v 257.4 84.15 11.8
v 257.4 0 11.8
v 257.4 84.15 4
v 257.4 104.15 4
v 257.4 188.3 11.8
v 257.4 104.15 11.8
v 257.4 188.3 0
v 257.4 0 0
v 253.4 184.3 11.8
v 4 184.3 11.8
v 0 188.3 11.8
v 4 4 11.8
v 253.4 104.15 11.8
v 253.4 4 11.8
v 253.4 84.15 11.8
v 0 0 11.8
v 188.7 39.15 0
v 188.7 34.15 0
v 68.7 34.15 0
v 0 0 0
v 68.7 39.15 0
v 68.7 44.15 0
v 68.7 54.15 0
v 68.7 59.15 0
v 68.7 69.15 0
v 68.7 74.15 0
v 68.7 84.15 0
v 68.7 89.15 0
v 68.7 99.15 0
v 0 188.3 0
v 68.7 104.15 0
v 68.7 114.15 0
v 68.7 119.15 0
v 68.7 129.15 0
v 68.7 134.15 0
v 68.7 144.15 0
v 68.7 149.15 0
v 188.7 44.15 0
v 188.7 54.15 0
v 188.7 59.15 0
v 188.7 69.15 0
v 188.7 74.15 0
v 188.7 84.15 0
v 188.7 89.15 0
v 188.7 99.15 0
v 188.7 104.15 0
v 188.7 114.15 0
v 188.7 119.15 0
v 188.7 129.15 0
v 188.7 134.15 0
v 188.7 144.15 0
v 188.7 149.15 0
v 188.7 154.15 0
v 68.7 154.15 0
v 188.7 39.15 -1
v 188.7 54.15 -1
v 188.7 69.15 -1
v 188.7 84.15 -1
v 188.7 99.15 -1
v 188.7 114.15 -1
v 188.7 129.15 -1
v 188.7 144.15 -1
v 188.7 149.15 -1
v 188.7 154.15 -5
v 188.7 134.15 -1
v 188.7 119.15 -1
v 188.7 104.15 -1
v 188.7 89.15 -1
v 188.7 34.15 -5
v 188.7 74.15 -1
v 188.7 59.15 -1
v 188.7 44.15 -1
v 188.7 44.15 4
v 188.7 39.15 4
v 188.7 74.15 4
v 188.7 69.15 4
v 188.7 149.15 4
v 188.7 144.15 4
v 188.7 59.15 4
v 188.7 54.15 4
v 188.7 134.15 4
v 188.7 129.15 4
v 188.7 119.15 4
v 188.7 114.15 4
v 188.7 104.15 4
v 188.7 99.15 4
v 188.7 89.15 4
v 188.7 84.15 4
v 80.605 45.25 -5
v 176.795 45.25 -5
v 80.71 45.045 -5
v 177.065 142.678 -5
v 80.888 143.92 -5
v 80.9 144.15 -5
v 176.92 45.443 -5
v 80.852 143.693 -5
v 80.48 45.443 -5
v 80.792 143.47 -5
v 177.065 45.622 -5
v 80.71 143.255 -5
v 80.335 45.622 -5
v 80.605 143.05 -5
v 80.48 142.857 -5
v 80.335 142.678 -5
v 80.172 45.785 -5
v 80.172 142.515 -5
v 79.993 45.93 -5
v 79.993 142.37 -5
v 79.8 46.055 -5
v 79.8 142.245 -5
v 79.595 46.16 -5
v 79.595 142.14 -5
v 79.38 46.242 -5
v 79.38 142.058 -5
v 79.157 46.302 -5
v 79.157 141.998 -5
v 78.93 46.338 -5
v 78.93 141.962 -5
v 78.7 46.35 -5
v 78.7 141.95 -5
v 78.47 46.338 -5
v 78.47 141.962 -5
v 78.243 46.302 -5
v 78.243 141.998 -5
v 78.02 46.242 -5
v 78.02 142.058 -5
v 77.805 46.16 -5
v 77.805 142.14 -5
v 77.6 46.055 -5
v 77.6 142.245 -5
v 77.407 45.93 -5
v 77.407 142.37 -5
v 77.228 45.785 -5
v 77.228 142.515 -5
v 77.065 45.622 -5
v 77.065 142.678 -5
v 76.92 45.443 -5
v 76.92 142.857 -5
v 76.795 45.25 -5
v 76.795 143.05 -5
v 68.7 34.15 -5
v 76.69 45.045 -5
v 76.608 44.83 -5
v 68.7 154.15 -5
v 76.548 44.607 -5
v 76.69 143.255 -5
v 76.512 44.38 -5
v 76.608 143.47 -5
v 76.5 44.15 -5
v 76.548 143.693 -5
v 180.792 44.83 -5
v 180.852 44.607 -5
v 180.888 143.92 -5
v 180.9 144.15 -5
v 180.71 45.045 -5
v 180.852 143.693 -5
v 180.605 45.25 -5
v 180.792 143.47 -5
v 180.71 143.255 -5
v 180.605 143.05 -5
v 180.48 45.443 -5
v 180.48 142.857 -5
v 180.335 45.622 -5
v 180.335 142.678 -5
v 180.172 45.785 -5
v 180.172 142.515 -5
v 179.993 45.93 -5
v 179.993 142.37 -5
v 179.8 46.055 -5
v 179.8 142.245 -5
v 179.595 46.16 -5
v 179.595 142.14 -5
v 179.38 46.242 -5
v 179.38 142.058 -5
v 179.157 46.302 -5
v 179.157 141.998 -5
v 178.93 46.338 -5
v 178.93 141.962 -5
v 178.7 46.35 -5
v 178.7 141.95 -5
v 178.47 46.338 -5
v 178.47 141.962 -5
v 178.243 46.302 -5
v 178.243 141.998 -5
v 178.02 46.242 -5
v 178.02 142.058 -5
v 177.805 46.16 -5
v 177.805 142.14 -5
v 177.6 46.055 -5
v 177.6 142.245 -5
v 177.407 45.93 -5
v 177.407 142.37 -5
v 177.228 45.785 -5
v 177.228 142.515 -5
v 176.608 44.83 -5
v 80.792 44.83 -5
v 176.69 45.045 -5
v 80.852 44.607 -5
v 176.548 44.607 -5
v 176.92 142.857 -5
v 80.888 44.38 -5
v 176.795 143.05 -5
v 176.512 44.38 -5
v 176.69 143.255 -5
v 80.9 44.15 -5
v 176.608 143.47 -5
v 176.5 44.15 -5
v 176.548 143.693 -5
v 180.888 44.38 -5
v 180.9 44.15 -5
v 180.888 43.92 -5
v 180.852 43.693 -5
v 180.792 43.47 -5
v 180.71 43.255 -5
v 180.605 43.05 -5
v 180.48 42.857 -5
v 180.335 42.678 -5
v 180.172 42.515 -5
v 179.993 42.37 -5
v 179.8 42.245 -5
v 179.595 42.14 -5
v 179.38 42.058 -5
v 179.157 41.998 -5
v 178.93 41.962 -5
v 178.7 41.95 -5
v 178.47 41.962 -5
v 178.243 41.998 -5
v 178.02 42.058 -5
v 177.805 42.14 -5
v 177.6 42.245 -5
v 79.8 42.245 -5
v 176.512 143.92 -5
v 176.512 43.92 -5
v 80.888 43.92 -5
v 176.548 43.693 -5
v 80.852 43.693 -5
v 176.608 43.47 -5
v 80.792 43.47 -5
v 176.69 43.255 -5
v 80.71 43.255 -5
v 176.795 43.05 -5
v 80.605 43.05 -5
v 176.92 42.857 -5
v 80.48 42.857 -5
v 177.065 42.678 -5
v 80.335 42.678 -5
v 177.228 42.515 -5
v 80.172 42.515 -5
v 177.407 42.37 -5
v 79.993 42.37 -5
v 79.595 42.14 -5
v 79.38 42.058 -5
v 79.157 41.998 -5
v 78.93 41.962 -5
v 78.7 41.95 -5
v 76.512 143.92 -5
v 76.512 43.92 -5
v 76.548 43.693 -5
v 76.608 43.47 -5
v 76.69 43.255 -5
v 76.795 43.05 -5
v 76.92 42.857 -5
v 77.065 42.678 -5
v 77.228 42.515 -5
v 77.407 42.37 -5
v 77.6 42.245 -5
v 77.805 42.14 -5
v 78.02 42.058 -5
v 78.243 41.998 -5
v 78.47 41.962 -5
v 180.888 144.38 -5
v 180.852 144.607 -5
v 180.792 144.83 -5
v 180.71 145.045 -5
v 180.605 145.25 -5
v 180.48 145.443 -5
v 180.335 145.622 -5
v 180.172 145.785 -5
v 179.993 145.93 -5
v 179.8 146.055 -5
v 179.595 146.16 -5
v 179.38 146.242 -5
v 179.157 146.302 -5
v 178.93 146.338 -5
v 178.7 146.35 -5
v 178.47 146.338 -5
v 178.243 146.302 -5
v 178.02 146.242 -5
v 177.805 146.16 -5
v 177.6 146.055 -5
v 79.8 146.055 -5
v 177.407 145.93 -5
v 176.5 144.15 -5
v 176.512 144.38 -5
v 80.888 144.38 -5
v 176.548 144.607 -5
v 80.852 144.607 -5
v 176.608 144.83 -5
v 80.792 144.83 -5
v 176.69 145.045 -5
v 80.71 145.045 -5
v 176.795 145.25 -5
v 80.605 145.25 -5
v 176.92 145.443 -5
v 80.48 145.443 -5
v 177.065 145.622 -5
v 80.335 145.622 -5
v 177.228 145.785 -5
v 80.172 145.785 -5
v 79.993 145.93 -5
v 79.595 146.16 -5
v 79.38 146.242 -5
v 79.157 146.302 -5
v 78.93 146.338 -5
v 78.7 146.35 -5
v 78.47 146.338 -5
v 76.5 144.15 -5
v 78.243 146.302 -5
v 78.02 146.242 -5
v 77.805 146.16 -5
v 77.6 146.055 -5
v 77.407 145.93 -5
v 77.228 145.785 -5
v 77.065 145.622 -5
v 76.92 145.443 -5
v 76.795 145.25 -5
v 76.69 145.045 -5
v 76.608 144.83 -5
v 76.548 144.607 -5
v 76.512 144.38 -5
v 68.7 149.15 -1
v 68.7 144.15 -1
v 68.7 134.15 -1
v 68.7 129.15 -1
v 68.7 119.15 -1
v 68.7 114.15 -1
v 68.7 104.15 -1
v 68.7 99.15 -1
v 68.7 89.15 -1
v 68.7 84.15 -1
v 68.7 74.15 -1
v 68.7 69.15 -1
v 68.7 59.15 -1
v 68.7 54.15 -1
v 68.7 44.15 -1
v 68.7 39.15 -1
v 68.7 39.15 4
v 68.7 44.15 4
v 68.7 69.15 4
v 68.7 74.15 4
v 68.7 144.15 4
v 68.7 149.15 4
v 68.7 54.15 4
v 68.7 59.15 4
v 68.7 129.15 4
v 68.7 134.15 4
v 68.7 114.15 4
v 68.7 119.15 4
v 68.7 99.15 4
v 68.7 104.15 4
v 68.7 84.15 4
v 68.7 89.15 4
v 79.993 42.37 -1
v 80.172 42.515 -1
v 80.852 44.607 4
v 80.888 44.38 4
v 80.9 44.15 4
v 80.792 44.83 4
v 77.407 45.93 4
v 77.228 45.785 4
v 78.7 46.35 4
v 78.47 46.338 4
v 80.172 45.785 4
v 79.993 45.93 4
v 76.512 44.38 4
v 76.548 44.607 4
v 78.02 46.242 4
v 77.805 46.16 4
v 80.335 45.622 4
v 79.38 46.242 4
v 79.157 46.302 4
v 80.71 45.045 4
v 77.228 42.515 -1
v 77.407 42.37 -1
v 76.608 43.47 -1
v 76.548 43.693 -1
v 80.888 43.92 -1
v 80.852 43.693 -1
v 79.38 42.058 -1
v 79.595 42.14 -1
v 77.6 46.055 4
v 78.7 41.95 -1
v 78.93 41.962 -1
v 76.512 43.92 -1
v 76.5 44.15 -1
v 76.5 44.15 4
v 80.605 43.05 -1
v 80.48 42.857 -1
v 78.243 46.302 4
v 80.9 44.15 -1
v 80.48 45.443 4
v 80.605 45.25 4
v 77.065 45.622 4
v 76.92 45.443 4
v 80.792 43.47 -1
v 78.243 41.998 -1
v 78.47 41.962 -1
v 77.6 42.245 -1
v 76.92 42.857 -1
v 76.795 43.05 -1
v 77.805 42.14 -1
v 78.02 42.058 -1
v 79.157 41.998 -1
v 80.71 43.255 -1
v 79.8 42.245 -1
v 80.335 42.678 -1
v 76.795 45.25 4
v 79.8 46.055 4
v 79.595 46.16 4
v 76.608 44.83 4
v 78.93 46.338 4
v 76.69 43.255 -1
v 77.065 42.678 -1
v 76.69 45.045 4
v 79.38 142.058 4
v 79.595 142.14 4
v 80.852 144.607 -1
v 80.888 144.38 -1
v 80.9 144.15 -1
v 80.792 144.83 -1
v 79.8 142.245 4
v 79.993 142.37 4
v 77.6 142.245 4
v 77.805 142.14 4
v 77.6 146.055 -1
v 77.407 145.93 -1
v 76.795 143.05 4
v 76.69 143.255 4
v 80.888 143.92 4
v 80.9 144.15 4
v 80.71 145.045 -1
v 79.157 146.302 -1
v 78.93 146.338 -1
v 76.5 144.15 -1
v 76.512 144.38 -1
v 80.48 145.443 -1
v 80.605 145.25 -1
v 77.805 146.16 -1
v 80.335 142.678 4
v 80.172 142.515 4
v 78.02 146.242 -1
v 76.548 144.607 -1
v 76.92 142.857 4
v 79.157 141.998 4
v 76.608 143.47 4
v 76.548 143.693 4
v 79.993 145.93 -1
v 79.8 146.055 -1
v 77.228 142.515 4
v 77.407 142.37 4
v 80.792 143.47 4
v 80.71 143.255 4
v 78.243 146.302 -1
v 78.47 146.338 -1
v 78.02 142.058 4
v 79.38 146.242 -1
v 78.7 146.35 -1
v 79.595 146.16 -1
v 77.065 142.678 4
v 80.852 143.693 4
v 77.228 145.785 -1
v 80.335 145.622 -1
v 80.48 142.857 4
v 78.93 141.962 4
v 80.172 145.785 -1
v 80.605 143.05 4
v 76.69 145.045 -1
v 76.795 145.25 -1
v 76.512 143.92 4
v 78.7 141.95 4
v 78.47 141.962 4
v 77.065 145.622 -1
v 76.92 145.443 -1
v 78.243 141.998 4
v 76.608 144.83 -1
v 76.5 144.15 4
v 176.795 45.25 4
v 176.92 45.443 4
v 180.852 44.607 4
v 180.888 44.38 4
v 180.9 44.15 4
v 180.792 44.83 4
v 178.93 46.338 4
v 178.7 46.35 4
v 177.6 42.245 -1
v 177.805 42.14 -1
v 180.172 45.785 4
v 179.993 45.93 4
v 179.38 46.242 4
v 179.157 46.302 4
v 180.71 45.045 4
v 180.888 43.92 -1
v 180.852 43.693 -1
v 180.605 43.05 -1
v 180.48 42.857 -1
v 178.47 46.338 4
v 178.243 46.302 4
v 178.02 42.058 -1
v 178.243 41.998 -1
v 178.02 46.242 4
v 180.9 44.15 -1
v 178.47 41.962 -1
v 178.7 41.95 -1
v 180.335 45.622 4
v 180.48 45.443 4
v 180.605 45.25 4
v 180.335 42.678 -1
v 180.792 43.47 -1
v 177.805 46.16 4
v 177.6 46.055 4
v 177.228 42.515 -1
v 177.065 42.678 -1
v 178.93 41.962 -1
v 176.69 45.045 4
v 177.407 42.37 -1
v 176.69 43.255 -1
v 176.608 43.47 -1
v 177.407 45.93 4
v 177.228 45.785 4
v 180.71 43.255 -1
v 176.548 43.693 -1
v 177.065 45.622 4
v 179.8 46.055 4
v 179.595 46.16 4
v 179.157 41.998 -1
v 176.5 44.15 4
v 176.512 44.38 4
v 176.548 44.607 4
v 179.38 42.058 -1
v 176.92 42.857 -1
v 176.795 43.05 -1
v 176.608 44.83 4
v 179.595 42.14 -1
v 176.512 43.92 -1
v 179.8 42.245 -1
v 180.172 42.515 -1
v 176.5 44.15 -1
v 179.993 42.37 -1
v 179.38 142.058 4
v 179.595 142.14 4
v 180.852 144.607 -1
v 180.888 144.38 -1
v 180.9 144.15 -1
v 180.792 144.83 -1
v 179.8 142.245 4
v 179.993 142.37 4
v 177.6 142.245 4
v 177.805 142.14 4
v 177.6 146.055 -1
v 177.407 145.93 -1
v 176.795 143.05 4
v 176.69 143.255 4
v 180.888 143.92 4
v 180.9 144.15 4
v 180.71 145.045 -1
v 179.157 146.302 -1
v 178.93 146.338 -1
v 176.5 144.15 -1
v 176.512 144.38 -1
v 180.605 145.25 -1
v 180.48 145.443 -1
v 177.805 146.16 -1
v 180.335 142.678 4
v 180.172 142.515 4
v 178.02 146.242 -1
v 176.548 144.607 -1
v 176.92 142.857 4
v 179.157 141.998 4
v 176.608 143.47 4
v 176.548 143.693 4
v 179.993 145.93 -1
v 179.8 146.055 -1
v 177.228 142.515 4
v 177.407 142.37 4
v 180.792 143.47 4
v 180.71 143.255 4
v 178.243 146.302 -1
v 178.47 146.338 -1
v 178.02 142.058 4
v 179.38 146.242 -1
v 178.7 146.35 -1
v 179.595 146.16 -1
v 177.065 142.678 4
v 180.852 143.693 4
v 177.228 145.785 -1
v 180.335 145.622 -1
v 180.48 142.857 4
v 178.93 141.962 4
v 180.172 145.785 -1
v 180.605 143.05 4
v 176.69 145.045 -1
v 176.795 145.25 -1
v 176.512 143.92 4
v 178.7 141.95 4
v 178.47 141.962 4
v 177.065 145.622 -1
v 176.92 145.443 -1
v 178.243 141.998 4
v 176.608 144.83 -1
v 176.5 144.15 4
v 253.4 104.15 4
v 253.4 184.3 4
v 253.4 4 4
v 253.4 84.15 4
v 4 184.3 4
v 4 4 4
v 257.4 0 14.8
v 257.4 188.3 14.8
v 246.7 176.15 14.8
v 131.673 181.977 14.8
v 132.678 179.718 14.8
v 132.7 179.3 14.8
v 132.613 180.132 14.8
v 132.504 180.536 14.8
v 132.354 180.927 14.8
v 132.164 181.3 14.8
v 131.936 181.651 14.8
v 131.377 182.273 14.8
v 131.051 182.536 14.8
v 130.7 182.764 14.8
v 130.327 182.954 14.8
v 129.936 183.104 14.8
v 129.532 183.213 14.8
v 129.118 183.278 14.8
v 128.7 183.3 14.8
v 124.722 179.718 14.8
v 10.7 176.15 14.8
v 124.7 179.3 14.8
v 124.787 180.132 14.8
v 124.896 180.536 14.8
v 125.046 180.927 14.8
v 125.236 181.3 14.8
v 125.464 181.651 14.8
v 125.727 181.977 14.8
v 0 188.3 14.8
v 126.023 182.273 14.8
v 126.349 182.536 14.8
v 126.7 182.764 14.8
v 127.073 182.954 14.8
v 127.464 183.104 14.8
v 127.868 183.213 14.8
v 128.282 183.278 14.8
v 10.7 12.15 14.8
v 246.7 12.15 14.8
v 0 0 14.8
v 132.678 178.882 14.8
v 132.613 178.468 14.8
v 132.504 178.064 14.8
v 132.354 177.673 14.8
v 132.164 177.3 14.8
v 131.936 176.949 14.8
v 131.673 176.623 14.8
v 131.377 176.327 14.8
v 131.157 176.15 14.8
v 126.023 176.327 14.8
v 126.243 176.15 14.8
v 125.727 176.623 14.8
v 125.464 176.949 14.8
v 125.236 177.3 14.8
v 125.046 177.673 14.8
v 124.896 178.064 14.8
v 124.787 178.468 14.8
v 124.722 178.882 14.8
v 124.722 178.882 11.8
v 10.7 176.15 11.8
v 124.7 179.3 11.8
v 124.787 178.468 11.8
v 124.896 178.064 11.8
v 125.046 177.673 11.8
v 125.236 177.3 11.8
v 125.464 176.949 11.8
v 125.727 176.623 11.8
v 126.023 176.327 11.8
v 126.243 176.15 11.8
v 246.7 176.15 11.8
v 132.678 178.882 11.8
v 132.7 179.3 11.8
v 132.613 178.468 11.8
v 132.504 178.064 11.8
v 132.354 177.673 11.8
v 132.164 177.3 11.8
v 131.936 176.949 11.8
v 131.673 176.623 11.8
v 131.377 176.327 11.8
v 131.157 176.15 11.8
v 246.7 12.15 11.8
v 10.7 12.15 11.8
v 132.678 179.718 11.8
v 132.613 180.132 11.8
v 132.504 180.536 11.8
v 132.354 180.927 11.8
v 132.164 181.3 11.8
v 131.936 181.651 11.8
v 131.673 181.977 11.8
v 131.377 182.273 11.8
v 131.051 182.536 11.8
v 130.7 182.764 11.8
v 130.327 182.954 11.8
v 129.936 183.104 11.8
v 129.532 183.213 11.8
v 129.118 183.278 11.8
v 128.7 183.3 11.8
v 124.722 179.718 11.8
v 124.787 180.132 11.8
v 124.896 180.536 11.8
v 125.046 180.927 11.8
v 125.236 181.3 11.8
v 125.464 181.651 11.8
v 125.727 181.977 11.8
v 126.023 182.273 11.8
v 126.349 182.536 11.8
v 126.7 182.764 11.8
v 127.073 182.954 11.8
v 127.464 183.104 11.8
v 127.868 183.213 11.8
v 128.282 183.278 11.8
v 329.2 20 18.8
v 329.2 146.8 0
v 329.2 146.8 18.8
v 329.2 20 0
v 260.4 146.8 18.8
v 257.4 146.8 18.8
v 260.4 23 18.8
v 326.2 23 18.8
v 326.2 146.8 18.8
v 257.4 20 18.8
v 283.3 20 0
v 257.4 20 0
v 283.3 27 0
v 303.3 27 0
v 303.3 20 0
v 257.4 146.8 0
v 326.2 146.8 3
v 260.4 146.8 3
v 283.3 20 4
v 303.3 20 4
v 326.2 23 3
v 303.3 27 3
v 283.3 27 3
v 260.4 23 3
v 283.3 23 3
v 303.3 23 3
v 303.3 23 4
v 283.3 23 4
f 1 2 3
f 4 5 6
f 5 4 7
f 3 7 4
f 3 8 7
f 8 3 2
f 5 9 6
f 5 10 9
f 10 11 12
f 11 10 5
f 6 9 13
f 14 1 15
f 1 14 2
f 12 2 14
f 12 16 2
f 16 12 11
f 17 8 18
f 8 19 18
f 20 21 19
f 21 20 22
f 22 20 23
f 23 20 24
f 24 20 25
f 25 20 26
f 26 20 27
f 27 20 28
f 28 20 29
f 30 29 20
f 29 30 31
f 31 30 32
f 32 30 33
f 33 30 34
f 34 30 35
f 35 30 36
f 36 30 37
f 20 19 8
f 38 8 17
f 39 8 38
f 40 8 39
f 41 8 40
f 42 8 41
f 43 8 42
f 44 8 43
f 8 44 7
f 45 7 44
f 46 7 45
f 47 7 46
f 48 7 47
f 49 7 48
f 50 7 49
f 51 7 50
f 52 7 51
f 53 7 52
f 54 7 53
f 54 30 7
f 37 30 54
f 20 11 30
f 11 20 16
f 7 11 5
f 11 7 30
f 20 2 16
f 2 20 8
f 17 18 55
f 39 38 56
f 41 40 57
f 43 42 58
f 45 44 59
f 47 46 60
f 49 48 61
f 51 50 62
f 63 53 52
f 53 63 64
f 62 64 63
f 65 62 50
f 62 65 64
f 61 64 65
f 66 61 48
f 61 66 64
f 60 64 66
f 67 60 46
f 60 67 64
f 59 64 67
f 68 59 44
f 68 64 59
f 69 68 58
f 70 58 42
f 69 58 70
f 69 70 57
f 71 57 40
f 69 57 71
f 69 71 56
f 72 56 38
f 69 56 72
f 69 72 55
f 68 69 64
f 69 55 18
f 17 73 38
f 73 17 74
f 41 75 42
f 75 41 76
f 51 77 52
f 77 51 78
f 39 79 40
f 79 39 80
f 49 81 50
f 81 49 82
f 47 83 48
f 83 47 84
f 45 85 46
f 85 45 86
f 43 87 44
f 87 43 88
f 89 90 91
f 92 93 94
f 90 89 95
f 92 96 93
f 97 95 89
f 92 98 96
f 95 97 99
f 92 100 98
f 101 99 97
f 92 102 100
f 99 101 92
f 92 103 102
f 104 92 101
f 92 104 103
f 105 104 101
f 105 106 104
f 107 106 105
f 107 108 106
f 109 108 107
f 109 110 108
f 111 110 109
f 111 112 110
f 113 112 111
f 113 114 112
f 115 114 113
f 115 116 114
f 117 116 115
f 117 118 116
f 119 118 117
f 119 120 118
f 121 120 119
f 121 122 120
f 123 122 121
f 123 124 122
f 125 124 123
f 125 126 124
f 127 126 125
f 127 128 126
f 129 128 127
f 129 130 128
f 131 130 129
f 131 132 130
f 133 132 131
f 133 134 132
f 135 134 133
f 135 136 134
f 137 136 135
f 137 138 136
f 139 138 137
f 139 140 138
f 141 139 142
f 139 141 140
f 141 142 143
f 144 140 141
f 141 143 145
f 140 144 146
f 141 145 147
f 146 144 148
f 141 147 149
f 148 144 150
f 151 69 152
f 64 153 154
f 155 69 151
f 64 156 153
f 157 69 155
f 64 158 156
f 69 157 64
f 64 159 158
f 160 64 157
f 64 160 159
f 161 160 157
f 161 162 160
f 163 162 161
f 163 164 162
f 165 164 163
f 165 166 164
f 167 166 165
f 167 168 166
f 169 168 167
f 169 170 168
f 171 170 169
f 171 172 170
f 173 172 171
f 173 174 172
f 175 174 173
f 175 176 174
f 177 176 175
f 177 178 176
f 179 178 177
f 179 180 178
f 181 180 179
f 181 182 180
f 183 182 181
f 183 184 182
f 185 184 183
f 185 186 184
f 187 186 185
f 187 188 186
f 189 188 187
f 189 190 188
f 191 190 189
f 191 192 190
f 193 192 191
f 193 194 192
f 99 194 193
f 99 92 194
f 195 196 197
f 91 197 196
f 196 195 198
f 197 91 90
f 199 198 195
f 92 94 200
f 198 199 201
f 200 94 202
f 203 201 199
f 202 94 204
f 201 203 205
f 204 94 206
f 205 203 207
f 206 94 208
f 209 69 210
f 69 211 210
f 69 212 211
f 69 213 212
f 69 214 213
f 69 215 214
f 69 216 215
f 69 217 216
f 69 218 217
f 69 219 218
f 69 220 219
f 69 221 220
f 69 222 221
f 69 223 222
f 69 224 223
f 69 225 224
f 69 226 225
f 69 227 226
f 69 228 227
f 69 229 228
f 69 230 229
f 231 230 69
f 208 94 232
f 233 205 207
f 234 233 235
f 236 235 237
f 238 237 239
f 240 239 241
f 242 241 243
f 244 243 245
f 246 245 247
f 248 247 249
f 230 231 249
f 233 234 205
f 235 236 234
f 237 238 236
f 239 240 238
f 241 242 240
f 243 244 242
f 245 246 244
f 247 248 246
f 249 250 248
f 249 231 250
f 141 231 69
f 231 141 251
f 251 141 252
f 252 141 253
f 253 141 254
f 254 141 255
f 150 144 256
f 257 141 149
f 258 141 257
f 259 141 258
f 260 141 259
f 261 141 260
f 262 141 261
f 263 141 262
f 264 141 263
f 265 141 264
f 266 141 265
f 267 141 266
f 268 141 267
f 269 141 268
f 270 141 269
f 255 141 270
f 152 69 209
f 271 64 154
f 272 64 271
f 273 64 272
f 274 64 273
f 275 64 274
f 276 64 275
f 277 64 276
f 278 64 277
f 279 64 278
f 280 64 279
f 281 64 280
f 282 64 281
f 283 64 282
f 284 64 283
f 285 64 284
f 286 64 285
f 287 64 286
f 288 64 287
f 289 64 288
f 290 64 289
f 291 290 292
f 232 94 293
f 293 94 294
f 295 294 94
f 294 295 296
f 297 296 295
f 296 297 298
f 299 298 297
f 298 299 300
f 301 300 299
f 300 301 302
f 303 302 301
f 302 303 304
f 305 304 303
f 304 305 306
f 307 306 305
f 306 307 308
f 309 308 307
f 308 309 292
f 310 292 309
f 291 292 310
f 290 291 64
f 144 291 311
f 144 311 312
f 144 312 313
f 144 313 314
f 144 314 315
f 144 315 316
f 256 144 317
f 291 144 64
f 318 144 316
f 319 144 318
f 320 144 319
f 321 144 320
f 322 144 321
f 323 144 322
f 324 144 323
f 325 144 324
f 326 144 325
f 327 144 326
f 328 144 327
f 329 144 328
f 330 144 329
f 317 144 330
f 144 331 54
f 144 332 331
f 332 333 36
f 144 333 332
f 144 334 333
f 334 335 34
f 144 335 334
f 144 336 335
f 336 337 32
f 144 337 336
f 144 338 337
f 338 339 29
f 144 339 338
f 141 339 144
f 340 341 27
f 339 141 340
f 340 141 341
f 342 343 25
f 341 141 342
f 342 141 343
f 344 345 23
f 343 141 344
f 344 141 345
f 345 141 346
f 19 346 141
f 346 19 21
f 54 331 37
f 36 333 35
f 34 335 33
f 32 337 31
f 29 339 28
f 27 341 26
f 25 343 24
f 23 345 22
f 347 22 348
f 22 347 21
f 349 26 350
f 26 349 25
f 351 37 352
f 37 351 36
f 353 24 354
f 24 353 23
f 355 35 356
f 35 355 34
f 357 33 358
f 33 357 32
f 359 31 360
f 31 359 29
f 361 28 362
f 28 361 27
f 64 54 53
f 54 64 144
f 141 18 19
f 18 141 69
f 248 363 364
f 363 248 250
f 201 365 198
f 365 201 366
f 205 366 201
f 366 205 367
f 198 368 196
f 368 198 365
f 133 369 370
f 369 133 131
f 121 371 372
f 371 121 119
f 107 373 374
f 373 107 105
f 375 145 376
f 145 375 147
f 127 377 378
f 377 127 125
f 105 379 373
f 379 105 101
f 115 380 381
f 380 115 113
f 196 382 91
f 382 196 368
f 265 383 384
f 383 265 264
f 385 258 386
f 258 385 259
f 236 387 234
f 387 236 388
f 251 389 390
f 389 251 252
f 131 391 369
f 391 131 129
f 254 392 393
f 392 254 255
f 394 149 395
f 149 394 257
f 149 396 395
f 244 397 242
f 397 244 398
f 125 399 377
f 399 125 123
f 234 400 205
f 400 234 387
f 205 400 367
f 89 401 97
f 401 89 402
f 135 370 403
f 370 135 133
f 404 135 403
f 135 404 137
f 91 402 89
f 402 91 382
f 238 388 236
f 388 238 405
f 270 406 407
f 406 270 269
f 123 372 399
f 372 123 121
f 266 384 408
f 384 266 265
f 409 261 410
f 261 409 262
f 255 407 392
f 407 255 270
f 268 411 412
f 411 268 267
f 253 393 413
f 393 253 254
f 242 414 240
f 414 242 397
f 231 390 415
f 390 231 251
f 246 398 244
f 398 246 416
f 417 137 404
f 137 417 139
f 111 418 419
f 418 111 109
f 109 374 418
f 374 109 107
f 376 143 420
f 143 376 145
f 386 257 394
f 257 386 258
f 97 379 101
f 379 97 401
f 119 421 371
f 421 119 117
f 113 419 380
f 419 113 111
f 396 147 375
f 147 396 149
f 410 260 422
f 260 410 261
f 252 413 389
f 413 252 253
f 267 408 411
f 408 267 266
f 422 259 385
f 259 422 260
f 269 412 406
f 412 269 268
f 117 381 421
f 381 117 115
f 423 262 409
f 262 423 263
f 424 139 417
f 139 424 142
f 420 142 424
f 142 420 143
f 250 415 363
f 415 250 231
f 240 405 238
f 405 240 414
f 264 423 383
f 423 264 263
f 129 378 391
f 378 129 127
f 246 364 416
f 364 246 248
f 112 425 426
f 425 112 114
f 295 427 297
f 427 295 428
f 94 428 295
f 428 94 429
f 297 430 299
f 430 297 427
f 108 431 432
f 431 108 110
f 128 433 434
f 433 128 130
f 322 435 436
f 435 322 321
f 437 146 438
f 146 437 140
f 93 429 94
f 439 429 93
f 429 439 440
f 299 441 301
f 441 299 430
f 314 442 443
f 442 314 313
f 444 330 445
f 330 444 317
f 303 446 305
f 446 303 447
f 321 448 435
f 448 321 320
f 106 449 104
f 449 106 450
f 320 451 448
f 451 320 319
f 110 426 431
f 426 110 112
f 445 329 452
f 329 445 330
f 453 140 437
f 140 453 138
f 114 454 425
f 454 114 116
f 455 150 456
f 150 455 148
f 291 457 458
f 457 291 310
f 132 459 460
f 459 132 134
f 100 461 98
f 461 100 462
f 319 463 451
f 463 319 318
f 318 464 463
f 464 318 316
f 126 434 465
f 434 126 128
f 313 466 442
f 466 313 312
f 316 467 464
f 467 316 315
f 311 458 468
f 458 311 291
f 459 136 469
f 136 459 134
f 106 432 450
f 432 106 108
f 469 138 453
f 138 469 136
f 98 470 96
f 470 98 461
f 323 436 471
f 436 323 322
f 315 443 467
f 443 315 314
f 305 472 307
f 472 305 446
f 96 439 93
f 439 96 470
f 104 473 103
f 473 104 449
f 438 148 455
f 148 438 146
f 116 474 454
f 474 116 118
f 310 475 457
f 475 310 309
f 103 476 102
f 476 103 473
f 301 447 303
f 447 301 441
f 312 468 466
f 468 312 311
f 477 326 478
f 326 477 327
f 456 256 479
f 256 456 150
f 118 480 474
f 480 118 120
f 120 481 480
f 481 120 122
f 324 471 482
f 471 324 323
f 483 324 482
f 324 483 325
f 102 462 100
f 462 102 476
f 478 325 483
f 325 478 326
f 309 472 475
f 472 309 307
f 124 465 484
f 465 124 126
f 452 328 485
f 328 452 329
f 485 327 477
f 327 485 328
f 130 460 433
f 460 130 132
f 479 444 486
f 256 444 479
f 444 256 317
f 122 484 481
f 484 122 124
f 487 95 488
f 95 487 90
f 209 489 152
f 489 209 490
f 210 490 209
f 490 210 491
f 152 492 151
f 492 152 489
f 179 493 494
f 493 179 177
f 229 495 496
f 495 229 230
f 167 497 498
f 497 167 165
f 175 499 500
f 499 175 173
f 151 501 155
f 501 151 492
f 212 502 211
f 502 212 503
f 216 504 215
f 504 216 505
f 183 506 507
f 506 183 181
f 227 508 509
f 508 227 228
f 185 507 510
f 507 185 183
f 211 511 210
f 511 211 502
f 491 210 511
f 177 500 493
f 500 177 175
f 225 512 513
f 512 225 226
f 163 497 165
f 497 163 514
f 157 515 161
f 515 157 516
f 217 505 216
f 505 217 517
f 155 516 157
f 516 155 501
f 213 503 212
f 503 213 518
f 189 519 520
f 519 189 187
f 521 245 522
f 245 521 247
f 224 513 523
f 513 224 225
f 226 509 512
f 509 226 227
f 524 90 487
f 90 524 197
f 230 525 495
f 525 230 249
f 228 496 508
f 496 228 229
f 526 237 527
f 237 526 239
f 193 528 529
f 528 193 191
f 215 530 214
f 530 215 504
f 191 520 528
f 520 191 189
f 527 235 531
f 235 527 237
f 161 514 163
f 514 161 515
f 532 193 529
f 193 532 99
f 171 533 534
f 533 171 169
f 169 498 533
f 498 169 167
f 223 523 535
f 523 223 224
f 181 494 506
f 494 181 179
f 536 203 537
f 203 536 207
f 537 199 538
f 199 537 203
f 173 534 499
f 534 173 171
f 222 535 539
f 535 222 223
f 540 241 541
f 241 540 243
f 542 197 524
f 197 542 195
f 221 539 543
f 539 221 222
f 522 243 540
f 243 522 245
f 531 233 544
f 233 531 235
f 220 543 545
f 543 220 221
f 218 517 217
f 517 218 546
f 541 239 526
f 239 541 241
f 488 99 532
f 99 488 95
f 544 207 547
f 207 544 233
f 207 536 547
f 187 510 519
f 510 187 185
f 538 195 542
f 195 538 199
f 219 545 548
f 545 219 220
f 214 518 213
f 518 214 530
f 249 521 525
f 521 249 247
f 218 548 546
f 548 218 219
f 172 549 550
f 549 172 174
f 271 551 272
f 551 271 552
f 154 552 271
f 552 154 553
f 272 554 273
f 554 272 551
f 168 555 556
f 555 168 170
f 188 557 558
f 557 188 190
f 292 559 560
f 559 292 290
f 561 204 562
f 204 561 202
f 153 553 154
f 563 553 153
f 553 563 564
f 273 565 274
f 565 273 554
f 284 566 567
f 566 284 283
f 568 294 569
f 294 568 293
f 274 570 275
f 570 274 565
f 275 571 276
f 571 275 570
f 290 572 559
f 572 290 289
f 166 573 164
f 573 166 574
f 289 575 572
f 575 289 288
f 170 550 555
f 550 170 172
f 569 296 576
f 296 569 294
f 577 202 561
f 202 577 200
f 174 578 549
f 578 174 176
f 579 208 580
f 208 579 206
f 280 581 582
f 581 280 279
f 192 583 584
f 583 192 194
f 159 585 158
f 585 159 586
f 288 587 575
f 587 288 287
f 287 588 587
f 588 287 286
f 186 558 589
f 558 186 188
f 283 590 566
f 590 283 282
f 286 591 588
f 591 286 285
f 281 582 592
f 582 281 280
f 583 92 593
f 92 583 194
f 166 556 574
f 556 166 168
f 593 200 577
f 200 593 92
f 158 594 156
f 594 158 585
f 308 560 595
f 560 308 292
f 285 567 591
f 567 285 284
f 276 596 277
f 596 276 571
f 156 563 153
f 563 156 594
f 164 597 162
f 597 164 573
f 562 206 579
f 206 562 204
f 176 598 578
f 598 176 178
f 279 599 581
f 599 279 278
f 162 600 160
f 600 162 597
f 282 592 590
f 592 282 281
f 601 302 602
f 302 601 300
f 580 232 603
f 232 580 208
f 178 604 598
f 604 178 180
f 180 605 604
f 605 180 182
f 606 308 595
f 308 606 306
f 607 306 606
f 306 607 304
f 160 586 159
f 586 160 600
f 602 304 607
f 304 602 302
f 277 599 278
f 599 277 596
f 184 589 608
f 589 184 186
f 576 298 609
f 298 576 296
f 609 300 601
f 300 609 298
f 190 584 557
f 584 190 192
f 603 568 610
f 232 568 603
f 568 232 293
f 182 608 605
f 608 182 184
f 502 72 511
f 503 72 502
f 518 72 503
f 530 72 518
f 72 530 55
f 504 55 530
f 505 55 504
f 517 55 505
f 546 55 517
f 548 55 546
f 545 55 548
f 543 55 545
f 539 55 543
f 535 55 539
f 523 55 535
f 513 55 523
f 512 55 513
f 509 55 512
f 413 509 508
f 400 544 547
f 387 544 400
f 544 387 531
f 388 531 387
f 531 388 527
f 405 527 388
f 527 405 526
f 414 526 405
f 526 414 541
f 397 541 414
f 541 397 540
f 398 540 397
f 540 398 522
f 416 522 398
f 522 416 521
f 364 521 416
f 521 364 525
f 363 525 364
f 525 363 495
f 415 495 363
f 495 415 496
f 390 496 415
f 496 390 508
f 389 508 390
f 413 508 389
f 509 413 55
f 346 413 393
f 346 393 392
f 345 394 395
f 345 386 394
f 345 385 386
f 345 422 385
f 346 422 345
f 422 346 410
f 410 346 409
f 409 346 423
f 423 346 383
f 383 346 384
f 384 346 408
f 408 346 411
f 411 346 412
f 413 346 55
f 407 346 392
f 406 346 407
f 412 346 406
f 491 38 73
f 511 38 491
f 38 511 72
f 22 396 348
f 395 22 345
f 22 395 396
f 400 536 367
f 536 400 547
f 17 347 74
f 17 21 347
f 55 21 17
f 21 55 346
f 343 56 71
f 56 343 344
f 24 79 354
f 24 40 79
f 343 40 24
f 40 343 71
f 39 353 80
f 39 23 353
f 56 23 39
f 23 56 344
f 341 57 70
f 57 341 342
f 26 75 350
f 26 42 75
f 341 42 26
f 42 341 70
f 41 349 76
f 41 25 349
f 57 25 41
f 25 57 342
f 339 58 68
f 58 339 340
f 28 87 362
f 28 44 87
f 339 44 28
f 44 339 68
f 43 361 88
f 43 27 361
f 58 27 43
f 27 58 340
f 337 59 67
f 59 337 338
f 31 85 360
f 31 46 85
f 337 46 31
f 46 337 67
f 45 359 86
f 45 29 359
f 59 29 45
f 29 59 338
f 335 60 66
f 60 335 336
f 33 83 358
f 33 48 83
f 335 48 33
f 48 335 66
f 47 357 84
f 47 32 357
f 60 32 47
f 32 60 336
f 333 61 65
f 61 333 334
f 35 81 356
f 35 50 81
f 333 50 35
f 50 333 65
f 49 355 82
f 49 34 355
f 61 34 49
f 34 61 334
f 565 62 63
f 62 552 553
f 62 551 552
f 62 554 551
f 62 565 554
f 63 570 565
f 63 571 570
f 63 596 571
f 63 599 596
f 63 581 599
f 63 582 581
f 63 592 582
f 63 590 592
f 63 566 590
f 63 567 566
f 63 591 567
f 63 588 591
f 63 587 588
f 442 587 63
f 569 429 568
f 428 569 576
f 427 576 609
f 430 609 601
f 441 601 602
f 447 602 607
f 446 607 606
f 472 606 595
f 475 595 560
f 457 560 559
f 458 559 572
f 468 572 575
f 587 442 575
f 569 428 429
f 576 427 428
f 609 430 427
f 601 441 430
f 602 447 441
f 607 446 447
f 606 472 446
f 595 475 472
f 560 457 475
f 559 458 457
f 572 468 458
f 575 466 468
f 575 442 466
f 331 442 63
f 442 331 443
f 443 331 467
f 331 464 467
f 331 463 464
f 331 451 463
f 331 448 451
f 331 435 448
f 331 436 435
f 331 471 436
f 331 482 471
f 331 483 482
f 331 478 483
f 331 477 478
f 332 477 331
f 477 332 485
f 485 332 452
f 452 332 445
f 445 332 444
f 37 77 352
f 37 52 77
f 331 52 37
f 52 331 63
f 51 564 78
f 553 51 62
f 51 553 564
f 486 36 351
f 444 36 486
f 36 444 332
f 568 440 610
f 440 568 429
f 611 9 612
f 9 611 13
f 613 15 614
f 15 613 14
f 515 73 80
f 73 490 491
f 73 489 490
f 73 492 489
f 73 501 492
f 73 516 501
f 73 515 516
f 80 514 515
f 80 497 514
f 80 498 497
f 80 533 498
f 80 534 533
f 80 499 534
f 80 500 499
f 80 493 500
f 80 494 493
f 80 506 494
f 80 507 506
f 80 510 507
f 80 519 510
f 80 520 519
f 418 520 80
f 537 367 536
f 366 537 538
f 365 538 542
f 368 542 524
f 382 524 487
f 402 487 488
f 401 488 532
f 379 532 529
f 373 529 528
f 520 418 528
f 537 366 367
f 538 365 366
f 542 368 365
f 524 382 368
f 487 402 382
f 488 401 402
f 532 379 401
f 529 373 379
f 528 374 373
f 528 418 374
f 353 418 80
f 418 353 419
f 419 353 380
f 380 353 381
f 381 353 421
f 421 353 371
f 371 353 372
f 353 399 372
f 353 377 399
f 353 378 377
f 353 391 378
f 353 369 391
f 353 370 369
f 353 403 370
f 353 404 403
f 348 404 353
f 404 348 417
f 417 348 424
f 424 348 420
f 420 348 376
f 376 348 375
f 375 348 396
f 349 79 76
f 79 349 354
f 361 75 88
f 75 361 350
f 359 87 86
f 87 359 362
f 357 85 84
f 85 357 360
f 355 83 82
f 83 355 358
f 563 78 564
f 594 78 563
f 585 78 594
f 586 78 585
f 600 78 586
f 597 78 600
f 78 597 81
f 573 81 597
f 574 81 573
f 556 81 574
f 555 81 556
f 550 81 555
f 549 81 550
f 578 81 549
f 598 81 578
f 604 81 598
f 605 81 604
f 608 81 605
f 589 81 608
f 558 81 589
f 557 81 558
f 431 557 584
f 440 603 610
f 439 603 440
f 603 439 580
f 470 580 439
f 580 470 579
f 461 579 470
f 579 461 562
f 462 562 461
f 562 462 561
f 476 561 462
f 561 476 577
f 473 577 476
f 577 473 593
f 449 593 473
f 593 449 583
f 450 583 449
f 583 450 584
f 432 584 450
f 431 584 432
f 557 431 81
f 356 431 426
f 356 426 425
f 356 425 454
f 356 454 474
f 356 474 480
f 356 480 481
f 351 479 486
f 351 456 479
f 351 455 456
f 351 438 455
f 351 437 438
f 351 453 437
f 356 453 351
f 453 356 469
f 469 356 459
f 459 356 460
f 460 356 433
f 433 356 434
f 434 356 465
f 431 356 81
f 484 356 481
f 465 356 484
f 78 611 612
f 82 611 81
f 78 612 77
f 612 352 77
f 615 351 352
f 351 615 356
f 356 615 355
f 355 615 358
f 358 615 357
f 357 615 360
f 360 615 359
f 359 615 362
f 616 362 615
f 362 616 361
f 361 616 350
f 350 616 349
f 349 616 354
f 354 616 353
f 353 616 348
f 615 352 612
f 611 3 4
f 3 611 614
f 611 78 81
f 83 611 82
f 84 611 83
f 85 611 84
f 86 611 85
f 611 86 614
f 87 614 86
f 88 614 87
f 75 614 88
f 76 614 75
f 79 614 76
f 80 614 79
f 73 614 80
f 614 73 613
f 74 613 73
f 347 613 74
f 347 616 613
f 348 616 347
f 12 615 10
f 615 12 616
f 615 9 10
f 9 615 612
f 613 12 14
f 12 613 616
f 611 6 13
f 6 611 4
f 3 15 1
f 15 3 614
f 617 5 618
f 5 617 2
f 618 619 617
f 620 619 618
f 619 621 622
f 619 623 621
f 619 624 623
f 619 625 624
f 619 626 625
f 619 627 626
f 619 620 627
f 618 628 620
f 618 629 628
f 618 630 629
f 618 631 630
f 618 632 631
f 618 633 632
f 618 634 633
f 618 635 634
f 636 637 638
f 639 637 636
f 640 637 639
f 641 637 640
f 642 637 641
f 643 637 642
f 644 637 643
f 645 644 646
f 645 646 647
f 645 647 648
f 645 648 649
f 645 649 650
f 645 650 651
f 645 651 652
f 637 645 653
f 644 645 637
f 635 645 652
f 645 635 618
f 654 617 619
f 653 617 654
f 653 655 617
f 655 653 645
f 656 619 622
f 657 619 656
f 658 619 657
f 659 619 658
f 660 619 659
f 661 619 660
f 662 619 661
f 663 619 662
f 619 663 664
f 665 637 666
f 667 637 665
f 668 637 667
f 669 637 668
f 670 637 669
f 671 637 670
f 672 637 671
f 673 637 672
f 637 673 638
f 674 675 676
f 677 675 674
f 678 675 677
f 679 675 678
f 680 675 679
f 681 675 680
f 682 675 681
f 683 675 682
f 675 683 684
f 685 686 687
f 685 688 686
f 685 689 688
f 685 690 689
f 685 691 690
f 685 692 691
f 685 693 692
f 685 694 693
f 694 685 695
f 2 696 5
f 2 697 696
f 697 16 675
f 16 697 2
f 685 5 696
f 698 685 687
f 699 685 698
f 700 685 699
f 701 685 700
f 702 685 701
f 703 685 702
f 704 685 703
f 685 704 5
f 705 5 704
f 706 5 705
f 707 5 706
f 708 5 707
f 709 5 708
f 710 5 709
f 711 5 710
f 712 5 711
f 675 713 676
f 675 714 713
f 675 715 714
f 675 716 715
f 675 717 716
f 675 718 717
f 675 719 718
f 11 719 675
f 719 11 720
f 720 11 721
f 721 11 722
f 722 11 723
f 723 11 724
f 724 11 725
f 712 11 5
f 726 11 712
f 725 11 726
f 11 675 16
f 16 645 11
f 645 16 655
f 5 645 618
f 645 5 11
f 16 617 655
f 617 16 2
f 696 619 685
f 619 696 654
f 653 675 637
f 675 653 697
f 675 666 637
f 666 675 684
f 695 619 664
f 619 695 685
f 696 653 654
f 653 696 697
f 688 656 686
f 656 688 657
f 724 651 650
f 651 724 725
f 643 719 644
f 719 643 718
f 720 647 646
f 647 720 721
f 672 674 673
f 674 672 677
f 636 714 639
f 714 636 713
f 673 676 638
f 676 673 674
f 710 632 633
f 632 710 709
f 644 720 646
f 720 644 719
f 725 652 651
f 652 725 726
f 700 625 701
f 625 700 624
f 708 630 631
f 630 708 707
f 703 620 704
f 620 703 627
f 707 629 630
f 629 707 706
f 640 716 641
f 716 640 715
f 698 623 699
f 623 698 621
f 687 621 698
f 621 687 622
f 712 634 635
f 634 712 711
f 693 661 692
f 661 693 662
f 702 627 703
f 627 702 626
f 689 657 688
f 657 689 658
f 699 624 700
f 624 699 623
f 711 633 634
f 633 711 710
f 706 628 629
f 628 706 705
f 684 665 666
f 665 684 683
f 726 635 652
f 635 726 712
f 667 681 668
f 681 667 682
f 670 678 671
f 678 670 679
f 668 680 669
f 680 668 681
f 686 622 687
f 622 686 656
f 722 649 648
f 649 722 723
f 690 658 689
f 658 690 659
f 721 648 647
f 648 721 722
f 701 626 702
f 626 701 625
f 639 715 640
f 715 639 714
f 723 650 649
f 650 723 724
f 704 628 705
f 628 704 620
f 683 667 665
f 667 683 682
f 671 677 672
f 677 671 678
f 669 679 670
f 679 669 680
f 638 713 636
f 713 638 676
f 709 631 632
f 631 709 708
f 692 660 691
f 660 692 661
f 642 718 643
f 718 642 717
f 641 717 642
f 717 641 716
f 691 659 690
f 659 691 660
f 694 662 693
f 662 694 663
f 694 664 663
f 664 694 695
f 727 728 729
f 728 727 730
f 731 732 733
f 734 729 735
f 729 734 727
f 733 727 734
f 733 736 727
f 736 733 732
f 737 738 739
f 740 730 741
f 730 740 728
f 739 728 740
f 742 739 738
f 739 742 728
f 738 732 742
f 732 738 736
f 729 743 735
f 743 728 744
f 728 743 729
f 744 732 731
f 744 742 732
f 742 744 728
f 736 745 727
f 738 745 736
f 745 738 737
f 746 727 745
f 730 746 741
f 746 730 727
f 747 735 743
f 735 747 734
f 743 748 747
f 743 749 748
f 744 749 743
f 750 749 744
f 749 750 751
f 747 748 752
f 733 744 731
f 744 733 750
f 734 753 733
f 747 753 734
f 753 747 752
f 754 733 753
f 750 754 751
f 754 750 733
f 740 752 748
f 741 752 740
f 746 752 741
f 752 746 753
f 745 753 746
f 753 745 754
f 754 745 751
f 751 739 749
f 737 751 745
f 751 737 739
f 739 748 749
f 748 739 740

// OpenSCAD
// ==========================================
// aTM Kiosk Terminal - Parametric Enclosure
// Target Printer: Bambu Lab (256x256mm Bed)
// Target Device: iPad 10th Gen (10.9")
// eGK Reader: CHERRY TC 1200
// ==========================================

// --- Rendering Resolution ---
$fn = 60;

// --- Parametrische Einstellungen ---
// 1. Tablet (iPad 10)
tablet_w = 248.6;
tablet_h = 179.5;
tablet_d = 7.0;

// Toleranz für den Einschub (Passung)
tol = 0.8;

// Display Ausschnitt
display_w = 236;
display_h = 164;

// Wandstärken
wall_th = 4.0;
face_th = 3.0; // Dicke der Frontblende

// 2. eGK-Lesegerät (CHERRY TC 1200)
egk_w = 65;
egk_h = 120;
egk_d = 15;

// 3. VESA Mount (100x100)
vesa_spacing = 100.0;
vesa_hole_r = 2.2; // M4 Kernloch/Bohrung für Gewindeeinsätze
vesa_reinforcement = 5.0; // Zusätzliche Dicke für die VESA-Platte

// --- Berechnete Dimensionen ---
outer_w = tablet_w + tol + (wall_th * 2);
outer_h = tablet_h + tol + (wall_th * 2);
outer_d = tablet_d + tol + face_th + wall_th;

// Modus-Steuerung zum Slicen in Bambu Studio
// Optionen: "full", "left_half", "right_half", "egk_dock"
render_mode = "full"; 

// ==========================================
// Hauptmodule
// ==========================================

module tablet_case_back() {
    difference() {
        // Grundkörper (Rückwand + Seitenwände)
        union() {
            cube([outer_w, outer_h, outer_d - face_th]);
            
            // VESA Verstärkung mittig
            translate([(outer_w - 120)/2, (outer_h - 120)/2, -vesa_reinforcement])
                cube([120, 120, vesa_reinforcement]);
        }
        
        // Innerer Ausschnitt für das Tablet
        translate([wall_th, wall_th, wall_th])
            cube([tablet_w + tol, tablet_h + tol, outer_d]);
            
        // VESA Bohrungen (100x100 M4)
        translate([outer_w/2, outer_h/2, -vesa_reinforcement - 1]) {
            for(x = [-vesa_spacing/2, vesa_spacing/2]) {
                for(y = [-vesa_spacing/2, vesa_spacing/2]) {
                    translate([x, y, 0])
                        cylinder(r=vesa_hole_r, h=outer_d + vesa_reinforcement + 2);
                }
            }
        }
        
        // Lüftungsschlitze (Thermik)
        for(i = [1 : 8]) {
            translate([outer_w/2 - 60, outer_h/2 - 70 + (i*15), -1])
                cube([120, 5, wall_th + 2]);
        }
        
        // Lade-Kabelauslass (Seitlich rechts)
        translate([outer_w - wall_th - 1, outer_h/2 - 10, wall_th])
            cube([wall_th + 2, 20, tablet_d + tol]);
    }
}

module tablet_face_plate() {
    difference() {
        // Faceplate Grundkörper
        cube([outer_w, outer_h, face_th]);
        
        // Display-Ausschnitt (zentriert)
        translate([(outer_w - display_w)/2, (outer_h - display_h)/2, -1])
            cube([display_w, display_h, face_th + 2]);
            
        // Kamera-Aussparung (oben mittig)
        translate([outer_w/2, outer_h - wall_th - 5, -1])
            cylinder(r=4, h=face_th + 2);
    }
}

module egk_dock() {
    dock_wall = 3.0;
    dock_outer_w = egk_w + tol + (dock_wall * 2);
    dock_outer_h = egk_h + tol + (dock_wall * 2);
    dock_outer_d = egk_d + tol + dock_wall;
    
    difference() {
        // Dock Grundkörper
        cube([dock_outer_w, dock_outer_h, dock_outer_d]);
        
        // Innerer Ausschnitt für Cherry TC 1200
        translate([dock_wall, dock_wall, dock_wall])
            cube([egk_w + tol, egk_h + tol + 10, egk_d + tol]); // +10h für Einschuböffnung oben
            
        // Kabelführungsschlitz unten nach hinten
        translate([dock_outer_w/2 - 10, -1, -1])
            cube([20, dock_wall + 5, dock_wall + 2]);
            
        // Karten-Einschubschlitz vorne (Bedienseite)
        translate([dock_wall + 10, dock_outer_h - dock_wall - 1, dock_wall + 5])
            cube([egk_w - 20 + tol, dock_wall + 2, 5]);
    }
}

// ==========================================
// Schwalbenschwanz / Modulare Splittung
// ==========================================

// Da das iPad (248.6mm) + Wände (8mm) = 256.6mm beträgt, 
// überschreitet es minimal das Bambu Bett (256x256mm).
// Wir schneiden es mit einem Zickzack-Verbinder in der Mitte durch.

module full_case() {
    union() {
        tablet_case_back();
        translate([0, 0, outer_d - face_th])
            tablet_face_plate();
    }
}

module split_left() {
    intersection() {
        full_case();
        // Schnitt bei X = Hälfte
        cube([outer_w/2 + 5, outer_h, outer_d * 2]);
    }
}

module split_right() {
    intersection() {
        full_case();
        translate([outer_w/2 + 5, 0, 0])
            cube([outer_w/2, outer_h, outer_d * 2]);
    }
}

// ==========================================
// Rendering-Auswahl
// ==========================================

if (render_mode == "full") {
    // 1. Tablet Gehäuse
    full_case();
    
    // 2. eGK Dock (angebaut an der rechten Seite)
    translate([outer_w, 20, 0])
        egk_dock();
} 
else if (render_mode == "left_half") {
    split_left();
} 
else if (render_mode == "right_half") {
    split_right();
} 
else if (render_mode == "egk_dock") {
    egk_dock();
}
